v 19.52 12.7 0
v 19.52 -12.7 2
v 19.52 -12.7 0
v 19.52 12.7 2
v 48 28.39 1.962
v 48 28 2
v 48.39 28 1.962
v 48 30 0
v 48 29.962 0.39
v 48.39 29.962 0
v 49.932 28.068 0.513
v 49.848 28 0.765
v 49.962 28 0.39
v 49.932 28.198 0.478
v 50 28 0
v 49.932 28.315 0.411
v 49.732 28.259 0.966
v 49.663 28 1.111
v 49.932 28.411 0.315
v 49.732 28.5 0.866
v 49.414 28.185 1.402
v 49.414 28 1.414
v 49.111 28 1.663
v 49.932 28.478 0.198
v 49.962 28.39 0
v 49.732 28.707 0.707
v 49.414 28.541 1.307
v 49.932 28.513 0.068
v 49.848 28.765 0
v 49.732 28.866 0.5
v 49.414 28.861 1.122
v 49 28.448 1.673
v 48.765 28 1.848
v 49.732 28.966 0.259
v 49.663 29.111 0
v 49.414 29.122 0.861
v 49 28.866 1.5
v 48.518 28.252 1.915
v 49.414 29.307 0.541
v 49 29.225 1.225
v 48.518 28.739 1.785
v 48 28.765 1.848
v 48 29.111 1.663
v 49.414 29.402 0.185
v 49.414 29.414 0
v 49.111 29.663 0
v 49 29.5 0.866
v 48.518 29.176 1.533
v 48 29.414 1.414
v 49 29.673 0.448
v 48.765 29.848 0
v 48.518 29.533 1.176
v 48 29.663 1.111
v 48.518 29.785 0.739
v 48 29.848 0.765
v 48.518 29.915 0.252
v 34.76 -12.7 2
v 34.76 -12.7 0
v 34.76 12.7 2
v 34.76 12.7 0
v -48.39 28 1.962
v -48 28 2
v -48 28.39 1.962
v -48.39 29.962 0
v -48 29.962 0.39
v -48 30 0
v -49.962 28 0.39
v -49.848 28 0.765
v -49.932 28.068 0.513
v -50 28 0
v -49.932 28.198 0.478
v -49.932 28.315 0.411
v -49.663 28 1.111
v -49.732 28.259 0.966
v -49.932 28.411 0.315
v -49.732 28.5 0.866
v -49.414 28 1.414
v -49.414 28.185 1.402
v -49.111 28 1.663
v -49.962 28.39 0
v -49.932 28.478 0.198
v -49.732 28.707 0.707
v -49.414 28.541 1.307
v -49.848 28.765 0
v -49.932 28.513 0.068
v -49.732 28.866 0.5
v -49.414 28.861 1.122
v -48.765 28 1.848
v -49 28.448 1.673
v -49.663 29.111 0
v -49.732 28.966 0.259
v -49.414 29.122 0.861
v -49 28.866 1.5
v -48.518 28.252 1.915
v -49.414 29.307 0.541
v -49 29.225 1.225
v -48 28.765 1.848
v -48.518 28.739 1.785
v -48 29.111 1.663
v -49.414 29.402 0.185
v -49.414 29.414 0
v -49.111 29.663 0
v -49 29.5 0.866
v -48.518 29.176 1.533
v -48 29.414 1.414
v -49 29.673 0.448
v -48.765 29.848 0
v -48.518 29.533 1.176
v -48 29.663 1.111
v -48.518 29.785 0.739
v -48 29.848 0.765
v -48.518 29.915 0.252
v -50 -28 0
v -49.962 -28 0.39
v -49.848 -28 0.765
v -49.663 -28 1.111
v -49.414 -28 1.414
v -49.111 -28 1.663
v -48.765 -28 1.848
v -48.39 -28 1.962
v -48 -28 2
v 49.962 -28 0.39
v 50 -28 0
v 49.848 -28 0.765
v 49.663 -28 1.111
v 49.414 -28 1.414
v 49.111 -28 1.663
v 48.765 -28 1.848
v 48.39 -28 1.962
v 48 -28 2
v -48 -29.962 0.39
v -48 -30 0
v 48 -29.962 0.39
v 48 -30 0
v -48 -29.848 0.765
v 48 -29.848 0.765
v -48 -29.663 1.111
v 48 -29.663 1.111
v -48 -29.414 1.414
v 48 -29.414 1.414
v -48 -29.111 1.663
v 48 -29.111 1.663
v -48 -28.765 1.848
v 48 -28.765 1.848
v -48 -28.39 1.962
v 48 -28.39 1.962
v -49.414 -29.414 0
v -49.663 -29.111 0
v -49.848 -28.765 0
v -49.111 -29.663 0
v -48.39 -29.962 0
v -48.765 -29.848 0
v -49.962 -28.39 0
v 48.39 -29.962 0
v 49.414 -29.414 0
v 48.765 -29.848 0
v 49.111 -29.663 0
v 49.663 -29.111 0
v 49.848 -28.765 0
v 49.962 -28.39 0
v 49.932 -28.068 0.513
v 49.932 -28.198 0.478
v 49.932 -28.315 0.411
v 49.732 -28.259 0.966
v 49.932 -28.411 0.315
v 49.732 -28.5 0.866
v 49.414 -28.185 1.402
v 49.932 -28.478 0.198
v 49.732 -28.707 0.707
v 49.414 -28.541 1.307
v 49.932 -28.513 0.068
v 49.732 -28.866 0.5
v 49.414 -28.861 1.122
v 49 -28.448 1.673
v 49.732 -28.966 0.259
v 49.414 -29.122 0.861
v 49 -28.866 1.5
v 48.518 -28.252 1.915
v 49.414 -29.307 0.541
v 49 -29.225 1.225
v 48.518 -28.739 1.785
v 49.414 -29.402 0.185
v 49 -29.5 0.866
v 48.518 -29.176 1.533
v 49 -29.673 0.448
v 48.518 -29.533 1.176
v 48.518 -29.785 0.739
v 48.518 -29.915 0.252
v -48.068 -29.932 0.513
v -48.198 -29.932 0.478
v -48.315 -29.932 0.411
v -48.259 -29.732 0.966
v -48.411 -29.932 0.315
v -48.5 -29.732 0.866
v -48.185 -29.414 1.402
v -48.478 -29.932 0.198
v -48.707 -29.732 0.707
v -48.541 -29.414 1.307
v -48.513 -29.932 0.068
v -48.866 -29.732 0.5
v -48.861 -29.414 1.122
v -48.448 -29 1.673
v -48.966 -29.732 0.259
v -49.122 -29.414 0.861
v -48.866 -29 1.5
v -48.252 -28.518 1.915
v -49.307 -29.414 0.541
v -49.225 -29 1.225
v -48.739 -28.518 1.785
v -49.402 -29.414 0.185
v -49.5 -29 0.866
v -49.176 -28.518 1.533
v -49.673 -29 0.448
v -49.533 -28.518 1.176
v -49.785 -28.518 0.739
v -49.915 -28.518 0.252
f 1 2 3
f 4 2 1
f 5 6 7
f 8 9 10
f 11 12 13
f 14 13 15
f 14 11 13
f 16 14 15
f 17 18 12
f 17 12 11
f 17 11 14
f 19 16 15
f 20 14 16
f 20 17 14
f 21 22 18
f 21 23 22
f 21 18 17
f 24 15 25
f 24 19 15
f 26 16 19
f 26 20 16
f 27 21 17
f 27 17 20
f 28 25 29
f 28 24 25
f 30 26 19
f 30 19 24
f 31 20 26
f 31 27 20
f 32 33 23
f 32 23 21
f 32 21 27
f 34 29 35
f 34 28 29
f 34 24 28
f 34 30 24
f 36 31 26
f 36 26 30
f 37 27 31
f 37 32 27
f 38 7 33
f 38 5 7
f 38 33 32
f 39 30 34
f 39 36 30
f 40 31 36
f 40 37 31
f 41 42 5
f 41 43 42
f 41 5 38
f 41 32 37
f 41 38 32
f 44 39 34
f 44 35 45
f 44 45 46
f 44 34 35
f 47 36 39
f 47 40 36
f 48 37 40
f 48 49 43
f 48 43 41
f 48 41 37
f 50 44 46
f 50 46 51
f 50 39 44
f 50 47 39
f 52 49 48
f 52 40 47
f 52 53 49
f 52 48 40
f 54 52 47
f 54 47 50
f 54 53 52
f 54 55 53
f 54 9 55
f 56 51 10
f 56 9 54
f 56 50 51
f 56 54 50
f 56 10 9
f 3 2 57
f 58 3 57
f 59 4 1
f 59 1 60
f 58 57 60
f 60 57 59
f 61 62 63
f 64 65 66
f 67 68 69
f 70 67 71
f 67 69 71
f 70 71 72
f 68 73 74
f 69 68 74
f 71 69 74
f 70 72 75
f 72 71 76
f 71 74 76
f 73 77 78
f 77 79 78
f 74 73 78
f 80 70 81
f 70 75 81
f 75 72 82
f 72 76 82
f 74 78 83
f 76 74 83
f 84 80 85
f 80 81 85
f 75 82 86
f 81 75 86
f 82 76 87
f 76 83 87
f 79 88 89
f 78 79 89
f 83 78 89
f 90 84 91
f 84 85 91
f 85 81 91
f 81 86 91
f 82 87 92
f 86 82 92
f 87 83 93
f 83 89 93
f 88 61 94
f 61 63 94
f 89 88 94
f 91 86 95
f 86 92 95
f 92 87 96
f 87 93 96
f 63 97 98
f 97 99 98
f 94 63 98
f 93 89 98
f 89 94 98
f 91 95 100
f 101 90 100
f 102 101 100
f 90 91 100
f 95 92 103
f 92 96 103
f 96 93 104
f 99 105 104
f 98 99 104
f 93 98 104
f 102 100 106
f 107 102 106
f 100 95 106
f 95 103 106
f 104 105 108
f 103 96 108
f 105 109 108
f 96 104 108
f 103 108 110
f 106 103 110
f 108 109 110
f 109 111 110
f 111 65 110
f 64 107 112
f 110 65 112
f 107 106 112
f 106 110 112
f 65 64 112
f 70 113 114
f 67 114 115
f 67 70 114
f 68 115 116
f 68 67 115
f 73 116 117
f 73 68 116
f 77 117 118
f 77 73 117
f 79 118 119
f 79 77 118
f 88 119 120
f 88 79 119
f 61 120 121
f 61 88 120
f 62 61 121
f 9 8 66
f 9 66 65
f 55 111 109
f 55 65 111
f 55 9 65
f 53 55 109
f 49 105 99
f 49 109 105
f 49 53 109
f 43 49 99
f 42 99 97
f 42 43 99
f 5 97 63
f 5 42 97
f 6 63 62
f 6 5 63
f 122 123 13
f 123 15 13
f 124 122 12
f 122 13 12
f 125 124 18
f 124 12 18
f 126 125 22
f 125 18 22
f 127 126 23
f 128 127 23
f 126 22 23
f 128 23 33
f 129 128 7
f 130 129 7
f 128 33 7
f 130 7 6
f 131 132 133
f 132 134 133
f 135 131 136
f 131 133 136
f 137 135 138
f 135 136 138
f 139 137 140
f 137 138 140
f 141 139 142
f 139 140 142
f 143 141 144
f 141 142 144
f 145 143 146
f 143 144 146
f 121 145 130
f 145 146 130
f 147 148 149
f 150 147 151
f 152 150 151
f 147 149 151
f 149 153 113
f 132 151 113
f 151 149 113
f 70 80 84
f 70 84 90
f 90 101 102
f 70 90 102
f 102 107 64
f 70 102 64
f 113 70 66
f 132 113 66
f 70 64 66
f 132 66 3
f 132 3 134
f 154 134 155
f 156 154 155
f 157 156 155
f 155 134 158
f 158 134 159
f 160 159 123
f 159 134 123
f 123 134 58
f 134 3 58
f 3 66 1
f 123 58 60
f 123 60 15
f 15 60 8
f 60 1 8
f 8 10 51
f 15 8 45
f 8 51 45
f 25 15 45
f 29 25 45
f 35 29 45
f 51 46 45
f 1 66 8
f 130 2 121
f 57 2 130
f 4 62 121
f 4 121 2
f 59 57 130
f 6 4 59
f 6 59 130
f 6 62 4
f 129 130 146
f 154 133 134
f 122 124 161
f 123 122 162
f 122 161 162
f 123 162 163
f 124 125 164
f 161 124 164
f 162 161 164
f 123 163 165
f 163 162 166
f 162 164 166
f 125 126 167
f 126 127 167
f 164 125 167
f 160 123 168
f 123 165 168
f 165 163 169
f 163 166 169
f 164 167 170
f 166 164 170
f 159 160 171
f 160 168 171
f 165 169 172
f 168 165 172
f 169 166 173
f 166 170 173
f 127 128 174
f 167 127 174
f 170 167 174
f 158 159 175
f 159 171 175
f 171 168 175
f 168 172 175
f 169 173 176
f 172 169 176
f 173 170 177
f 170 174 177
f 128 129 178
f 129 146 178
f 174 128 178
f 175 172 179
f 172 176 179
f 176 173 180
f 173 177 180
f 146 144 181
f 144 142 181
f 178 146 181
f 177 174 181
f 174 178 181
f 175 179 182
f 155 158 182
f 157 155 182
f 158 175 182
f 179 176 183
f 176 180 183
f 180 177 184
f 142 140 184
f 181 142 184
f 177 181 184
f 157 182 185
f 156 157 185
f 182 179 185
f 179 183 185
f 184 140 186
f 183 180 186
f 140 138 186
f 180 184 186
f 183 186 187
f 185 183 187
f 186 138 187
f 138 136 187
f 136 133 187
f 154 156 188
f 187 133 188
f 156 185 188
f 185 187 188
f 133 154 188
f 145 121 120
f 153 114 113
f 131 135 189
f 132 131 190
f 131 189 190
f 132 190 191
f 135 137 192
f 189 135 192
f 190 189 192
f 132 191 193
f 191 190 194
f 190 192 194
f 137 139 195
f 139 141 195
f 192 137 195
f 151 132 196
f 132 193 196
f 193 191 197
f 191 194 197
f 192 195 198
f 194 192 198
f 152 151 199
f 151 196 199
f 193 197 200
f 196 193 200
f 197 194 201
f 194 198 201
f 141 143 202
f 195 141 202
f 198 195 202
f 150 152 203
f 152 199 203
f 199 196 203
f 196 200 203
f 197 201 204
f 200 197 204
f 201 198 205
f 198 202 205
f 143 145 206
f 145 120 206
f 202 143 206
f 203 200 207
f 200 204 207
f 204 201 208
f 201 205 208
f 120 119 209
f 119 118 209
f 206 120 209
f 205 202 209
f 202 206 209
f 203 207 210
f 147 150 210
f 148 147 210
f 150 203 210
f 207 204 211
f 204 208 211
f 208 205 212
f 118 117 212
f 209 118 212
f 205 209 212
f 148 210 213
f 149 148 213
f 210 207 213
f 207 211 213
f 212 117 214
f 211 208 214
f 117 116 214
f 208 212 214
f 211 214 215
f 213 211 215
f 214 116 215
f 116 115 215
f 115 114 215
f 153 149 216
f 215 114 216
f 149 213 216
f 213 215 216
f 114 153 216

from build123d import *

# Parameters (mm, degrees)
SKETCH1_W           = 100
SKETCH1_H           = 60
BOSS_EXTRUDE1_DEPTH = 2
FILLET1_R           = 2
SKETCH2_W           = 15.24
SKETCH2_H           = 25.4
CUT_EXTRUDE1_DEPTH  = 59.343808583


with BuildPart() as part:
    # Sketch1 → Boss-Extrude1 (new body)
    with BuildSketch(Plane.XY):
        Rectangle(SKETCH1_W, SKETCH1_H)
    extrude(amount=BOSS_EXTRUDE1_DEPTH)

    # Fillet1
    fillet1_edges = [part.edges().sort_by_distance(p)[0] for p in [
        (0, 30, 2),
        (-50, 0, 2),
        (0, -30, 2),
        (50, 0, 2),
        (-50, -30, 1),
        (-50, 30, 1),
        (50, 30, 1),
        (50, -30, 1),
    ]]
    fillet(fillet1_edges, radius=FILLET1_R - 0.0001)  # a hair under: the kernel refuses the full size

    # Sketch2 → Cut-Extrude1 (cut, through all)
    with BuildSketch(Plane.XY.offset(2)):
        with Locations((27.14, 0)):
            Rectangle(SKETCH2_W, SKETCH2_H)
    extrude(amount=-CUT_EXTRUDE1_DEPTH, mode=Mode.SUBTRACT)


solid = part.part
